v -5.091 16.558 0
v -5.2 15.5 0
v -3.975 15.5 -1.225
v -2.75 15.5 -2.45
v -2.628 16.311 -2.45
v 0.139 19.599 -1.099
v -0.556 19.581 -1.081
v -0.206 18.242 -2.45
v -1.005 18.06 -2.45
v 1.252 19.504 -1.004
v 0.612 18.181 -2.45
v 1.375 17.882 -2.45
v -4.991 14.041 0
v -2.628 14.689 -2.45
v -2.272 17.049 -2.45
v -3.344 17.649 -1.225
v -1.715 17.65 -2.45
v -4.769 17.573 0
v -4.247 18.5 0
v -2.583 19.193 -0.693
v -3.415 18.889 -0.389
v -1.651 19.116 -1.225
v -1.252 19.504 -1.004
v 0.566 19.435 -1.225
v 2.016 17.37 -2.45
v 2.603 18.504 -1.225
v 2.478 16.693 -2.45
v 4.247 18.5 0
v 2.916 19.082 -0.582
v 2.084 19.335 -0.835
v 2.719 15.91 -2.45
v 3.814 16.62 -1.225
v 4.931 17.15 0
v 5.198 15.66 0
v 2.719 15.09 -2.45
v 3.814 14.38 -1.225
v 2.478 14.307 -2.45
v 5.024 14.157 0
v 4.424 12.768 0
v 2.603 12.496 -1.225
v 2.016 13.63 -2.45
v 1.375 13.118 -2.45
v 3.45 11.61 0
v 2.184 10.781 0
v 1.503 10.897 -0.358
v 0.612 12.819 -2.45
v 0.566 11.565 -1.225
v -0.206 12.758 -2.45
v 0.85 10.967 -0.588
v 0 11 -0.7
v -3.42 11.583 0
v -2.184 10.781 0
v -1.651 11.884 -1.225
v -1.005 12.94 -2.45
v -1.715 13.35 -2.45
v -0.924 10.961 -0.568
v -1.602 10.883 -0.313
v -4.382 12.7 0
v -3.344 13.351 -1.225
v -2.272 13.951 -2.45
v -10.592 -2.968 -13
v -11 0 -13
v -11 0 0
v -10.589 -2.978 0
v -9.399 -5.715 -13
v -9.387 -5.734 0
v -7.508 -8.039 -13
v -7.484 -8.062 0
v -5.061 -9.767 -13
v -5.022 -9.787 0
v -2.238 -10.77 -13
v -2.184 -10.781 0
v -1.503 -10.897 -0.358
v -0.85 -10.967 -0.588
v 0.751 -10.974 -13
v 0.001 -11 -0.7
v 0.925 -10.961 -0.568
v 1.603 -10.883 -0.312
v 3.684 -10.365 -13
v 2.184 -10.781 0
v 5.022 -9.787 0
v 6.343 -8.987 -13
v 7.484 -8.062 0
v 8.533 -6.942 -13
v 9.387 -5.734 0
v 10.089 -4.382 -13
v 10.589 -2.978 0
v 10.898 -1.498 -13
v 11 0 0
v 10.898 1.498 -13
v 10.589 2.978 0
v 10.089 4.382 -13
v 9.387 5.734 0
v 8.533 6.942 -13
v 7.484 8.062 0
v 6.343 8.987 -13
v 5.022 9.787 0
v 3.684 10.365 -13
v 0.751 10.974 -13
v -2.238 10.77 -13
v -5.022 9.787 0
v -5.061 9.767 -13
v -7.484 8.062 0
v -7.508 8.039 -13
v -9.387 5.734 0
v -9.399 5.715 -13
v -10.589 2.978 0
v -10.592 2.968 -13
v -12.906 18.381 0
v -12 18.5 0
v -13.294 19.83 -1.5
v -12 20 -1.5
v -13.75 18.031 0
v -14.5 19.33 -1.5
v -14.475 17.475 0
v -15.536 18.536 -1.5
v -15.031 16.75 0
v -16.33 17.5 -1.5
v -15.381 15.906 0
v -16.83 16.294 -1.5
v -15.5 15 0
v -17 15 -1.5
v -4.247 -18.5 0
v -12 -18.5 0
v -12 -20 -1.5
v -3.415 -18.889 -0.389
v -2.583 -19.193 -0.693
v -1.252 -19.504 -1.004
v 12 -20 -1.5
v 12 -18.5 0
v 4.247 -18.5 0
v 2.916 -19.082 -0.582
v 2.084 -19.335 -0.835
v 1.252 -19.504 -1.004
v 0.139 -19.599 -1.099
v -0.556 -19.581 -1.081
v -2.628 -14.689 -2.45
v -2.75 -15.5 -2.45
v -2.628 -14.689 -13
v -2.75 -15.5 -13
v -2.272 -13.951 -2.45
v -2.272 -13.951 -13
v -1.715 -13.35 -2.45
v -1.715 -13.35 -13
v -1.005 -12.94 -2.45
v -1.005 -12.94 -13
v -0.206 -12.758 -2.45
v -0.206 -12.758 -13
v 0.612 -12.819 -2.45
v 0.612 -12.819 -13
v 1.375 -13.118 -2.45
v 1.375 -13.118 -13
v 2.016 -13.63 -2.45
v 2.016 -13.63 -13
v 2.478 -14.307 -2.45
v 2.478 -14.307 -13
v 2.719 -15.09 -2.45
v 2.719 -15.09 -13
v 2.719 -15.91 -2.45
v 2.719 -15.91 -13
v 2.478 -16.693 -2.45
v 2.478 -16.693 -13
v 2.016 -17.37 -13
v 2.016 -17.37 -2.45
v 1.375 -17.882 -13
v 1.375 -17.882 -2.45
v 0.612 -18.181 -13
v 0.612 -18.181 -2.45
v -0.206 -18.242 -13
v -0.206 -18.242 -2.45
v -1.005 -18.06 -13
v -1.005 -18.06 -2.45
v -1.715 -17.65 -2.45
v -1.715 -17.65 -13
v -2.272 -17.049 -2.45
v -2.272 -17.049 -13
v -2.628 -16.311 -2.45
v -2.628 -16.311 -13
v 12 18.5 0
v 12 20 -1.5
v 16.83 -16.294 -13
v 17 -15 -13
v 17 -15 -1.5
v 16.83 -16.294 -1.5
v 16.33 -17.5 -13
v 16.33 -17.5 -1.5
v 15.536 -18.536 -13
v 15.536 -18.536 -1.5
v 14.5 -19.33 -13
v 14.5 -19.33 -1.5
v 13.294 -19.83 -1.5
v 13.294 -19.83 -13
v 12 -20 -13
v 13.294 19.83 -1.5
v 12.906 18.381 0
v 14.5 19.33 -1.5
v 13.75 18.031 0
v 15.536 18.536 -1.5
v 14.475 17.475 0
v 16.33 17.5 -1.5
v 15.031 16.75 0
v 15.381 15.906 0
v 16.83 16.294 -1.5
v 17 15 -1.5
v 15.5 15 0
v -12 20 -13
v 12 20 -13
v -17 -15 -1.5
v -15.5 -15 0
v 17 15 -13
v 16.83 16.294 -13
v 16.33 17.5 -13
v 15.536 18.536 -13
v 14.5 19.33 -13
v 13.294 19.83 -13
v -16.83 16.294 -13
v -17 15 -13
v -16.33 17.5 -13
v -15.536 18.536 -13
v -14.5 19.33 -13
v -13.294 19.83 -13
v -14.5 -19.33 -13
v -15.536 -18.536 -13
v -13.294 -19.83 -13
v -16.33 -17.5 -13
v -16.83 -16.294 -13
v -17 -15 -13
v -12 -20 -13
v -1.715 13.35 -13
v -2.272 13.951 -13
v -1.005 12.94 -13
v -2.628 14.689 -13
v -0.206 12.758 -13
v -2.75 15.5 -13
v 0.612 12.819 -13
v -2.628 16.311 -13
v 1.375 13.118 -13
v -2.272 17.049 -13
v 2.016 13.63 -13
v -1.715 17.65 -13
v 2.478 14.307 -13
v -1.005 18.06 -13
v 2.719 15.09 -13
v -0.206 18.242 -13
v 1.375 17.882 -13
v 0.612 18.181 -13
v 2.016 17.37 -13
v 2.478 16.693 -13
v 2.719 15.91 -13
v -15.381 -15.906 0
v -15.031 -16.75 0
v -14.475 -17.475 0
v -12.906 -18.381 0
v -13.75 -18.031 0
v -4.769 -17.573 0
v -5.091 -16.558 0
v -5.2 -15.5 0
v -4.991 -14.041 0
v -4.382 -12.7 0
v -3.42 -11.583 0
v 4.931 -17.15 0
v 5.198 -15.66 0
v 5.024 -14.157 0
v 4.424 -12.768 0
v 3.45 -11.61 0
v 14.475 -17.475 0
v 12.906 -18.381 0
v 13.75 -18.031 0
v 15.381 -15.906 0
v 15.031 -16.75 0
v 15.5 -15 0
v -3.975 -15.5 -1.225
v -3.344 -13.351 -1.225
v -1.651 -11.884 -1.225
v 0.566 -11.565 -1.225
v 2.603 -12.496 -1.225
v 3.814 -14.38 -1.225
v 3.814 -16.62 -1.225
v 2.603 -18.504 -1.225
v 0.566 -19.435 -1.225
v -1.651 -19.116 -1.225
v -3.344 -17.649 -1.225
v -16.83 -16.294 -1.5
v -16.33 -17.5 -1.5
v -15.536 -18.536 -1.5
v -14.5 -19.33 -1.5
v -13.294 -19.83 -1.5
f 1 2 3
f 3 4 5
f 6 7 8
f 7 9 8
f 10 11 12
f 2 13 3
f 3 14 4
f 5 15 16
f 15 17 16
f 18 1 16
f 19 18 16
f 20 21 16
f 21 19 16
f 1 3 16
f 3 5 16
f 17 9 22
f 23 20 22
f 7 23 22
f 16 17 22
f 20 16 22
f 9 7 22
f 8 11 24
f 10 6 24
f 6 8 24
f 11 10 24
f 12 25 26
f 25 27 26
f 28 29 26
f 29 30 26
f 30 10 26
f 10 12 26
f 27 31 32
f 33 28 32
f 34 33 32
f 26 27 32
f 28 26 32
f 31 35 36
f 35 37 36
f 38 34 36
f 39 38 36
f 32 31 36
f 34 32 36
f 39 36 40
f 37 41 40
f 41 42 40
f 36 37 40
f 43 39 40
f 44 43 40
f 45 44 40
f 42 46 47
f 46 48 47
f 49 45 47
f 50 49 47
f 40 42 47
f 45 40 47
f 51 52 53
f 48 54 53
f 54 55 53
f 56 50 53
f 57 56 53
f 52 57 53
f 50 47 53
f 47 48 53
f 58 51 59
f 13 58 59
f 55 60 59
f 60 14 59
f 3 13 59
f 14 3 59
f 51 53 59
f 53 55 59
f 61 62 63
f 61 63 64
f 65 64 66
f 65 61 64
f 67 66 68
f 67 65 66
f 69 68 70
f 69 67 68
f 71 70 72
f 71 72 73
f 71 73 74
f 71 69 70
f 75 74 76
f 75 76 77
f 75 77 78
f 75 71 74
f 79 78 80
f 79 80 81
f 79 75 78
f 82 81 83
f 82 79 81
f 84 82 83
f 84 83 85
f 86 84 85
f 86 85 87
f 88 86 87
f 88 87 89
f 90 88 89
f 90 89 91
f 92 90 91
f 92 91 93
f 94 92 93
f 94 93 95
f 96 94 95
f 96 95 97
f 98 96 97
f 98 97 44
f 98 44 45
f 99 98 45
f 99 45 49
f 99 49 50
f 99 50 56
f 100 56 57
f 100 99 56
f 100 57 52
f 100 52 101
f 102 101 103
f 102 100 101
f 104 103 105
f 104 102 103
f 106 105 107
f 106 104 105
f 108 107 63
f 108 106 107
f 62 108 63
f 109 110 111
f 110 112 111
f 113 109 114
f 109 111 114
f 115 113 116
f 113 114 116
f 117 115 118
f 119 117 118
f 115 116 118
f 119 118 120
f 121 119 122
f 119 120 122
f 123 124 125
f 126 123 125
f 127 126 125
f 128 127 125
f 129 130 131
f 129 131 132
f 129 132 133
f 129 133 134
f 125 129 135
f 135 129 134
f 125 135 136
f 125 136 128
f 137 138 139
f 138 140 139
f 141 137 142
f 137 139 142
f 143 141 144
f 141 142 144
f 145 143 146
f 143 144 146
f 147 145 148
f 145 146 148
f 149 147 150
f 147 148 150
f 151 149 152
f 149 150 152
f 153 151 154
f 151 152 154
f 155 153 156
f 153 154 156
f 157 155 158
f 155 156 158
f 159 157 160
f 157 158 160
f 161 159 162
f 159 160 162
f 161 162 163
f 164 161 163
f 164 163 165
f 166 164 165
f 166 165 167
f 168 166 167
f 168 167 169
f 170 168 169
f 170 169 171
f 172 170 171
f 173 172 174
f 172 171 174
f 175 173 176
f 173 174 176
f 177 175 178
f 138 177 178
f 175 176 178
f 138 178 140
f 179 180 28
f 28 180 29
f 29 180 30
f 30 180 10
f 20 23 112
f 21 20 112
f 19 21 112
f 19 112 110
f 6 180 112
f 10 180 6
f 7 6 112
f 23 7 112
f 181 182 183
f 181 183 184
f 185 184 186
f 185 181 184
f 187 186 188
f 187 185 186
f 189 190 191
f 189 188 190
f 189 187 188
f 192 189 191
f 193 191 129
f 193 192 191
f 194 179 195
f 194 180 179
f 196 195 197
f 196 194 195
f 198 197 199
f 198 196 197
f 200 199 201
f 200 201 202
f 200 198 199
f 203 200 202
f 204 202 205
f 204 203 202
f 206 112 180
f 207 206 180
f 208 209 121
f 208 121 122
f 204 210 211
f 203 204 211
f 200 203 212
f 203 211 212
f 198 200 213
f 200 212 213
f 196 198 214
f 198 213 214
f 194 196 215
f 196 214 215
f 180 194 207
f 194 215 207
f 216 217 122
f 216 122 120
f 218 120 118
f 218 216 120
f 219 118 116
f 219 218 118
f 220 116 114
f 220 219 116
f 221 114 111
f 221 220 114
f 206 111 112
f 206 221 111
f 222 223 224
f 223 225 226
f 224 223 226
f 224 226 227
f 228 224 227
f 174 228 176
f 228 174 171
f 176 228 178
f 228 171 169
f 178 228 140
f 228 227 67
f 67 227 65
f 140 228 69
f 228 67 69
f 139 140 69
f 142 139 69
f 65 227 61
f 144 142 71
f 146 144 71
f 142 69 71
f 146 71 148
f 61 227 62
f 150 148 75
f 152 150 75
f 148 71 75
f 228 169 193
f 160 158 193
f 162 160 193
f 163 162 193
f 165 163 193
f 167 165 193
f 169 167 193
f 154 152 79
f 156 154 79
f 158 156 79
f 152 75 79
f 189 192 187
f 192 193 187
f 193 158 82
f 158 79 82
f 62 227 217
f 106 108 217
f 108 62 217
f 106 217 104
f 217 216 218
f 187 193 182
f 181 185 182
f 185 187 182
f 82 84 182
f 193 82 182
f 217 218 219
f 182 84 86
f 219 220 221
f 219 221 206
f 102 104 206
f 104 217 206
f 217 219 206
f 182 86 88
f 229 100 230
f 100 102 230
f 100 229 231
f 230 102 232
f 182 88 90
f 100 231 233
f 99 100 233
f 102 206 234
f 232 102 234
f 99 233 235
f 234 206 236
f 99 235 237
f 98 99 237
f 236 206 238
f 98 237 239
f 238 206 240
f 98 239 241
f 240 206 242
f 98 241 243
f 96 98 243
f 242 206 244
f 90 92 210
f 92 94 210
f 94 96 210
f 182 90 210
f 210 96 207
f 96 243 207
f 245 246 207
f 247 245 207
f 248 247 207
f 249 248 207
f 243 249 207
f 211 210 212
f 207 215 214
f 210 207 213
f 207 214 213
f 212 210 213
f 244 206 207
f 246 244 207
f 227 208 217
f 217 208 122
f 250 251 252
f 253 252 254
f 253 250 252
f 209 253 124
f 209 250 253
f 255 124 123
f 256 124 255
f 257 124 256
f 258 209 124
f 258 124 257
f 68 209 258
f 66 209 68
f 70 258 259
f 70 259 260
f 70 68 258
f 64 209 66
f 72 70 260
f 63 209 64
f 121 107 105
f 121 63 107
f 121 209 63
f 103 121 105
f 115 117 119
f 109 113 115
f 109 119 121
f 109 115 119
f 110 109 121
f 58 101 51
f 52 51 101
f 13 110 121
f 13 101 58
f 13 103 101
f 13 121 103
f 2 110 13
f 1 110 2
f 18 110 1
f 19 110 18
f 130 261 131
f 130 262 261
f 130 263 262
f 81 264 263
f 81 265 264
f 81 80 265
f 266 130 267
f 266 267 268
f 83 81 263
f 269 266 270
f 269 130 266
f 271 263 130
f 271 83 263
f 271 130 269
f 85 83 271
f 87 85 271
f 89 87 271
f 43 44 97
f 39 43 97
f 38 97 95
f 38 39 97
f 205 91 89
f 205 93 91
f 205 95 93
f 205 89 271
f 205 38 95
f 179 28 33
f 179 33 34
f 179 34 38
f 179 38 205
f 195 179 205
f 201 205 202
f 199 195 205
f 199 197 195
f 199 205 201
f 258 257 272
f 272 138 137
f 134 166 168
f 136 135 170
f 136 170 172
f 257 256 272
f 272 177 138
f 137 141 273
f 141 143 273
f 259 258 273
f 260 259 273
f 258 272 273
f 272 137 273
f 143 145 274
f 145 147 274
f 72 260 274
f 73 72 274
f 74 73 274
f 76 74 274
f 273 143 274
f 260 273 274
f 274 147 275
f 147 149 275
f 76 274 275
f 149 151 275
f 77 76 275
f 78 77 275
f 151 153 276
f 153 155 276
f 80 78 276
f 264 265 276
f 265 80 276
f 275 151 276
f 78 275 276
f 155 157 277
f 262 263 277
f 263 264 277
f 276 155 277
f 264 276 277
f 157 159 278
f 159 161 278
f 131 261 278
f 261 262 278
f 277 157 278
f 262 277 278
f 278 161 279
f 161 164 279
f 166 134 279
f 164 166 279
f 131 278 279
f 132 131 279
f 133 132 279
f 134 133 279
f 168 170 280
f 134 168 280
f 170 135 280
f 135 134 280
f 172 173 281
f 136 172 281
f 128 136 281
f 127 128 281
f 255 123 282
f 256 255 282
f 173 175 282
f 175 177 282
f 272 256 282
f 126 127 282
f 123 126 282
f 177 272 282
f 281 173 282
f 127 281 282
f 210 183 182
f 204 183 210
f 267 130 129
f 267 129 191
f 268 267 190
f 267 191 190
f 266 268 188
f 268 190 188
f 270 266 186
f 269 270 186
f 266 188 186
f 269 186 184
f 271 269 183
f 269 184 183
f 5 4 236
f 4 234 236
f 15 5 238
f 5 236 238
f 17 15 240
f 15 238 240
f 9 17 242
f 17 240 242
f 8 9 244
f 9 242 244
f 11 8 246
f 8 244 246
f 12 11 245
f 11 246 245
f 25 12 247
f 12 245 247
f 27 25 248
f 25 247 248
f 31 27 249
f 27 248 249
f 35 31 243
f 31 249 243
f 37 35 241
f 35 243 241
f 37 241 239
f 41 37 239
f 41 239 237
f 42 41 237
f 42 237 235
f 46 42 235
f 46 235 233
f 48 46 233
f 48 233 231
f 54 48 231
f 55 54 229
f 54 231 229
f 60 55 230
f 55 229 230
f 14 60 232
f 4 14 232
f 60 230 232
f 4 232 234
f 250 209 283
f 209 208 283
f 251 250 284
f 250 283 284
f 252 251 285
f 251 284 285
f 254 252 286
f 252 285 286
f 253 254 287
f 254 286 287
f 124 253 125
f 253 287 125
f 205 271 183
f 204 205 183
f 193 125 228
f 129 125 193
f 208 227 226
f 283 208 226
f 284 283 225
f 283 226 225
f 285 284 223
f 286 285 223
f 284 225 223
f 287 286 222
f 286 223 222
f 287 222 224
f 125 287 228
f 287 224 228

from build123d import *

# Parameters (mm, degrees)
SKETCH_1_W                 = 34
SKETCH_1_H                 = 40
EXTRUDE_273_DEPTH          = 13
SKETCH_2_R                 = 11
CUT_EXTRUDE_457_DEPTH      = 13
HOLE_WIZARD_M6_D           = 5.5
HOLE_WIZARD_M6_CSINK_D     = 10.4
HOLE_WIZARD_M6_CSINK_ANGLE = 90
FILLET_1404_R              = 5
CHAMFER_1_SIZE             = 1.5


with BuildPart() as part:
    # Эскиз1 → Extrude 273 (new body)
    with BuildSketch(Plane.XY):
        Rectangle(SKETCH_1_W, SKETCH_1_H)
    extrude(amount=-EXTRUDE_273_DEPTH)

    # Эскиз2 → Cut-Extrude 457 (cut)
    with BuildSketch(Plane.XY.offset(-13)):
        with Locations(Location((0, 0, 0), (0, 0, 180))):
            Circle(SKETCH_2_R)
    extrude(amount=CUT_EXTRUDE_457_DEPTH, mode=Mode.SUBTRACT)

    # КреплениеM6 (through all)
    with Locations(Plane.XY):
        with Locations((0, 15.5), (0, -15.5)):
            CounterSinkHole(HOLE_WIZARD_M6_D / 2, HOLE_WIZARD_M6_CSINK_D / 2, counter_sink_angle=HOLE_WIZARD_M6_CSINK_ANGLE)

    # Fillet 1404
    fillet_1404_edges = [part.edges().sort_by_distance(p)[0] for p in [
        (17, -20, -6.5),
        (-17, -20, -6.5),
        (-17, 20, -6.5),
        (17, 20, -6.5),
    ]]
    fillet(fillet_1404_edges, radius=FILLET_1404_R)

    # Фаска1
    # the kernel refuses this chamfer: 1.5 mm, written as the material it takes off along each edge
    with BuildSketch(Plane(origin=(-12, -15, 0), x_dir=(-1, 0, 0), z_dir=(0, 1, 0))) as chamfer_1_piece_1:
        Polygon((5 - CHAMFER_1_SIZE, 0), (5, -CHAMFER_1_SIZE), (5, 0), align=None)
    revolve(axis=Axis((-12, -15, 0), (0, 0, 1)), revolution_arc=90, mode=Mode.SUBTRACT)
    with BuildSketch(Plane(origin=(1.251761638, -20, 0), x_dir=(0, 0.9996219169112968, 0.02749587661058636), z_dir=(-1, 0, 0)), Plane(origin=(12, -20, 0), x_dir=(0, 0.9996219169112968, 0.02749587661058636), z_dir=(-1, 0, 0))) as chamfer_1_piece_2:
        Polygon((CHAMFER_1_SIZE * 0.999621916911, CHAMFER_1_SIZE * 0.0274958766106), (-CHAMFER_1_SIZE * 0.0274958766106, CHAMFER_1_SIZE * 0.999621916911), (0, 0), align=None)
    extrude(amount=13.251761638, mode=Mode.SUBTRACT)
    with BuildSketch(Plane(origin=(12, -15, 0), x_dir=(0, -1, 0), z_dir=(-1, 0, 0))) as chamfer_1_piece_3:
        Polygon((5 - CHAMFER_1_SIZE, 0), (5, -CHAMFER_1_SIZE), (5, 0), align=None)
    revolve(axis=Axis((12, -15, 0), (0, 0, 1)), revolution_arc=90, mode=Mode.SUBTRACT)
    with BuildSketch(Plane(origin=(17, 15, 0), x_dir=(-0.9996219169112968, 0, 0.02749587661058636), z_dir=(0, -1, 0)), Plane(origin=(-17, -15, 0), x_dir=(0.9996219169112968, 0, 0.02749587661058636), z_dir=(0, 1, 0))) as chamfer_1_piece_4:
        Polygon((CHAMFER_1_SIZE * 0.999621916911, CHAMFER_1_SIZE * 0.0274958766106), (-CHAMFER_1_SIZE * 0.0274958766106, CHAMFER_1_SIZE * 0.999621916911), (0, 0), align=None)
    extrude(amount=30, mode=Mode.SUBTRACT)
    with BuildSketch(Plane(origin=(12, 15, 0), x_dir=(0, 1, 0), z_dir=(-1, 0, 0))) as chamfer_1_piece_5:
        Polygon((5 - CHAMFER_1_SIZE, 0), (5, CHAMFER_1_SIZE), (5, 0), align=None)
    revolve(axis=Axis((12, 15, 0), (0, 0, -1)), revolution_arc=90, mode=Mode.SUBTRACT)
    with BuildSketch(Plane(origin=(-12, 20, 0), x_dir=(0, 0.027495876610586778, -0.9996219169112968), z_dir=(1, 0, 0)), Plane(origin=(-1.251761638, 20, 0), x_dir=(0, 0.027495876610586778, -0.9996219169112968), z_dir=(1, 0, 0))) as chamfer_1_piece_6:
        Polygon((CHAMFER_1_SIZE * 0.999621916911, -CHAMFER_1_SIZE * 0.0274958766106), (-CHAMFER_1_SIZE * 0.0274958766106, -CHAMFER_1_SIZE * 0.999621916911), (0, 0), align=None)
    extrude(amount=13.251761638, mode=Mode.SUBTRACT)
    with BuildSketch(Plane(origin=(-12, 15, 0), x_dir=(0, 1, 0), z_dir=(1, 0, 0))) as chamfer_1_piece_7:
        Polygon((5 - CHAMFER_1_SIZE, 0), (5, -CHAMFER_1_SIZE), (5, 0), align=None)
    revolve(axis=Axis((-12, 15, 0), (0, 0, 1)), revolution_arc=90, mode=Mode.SUBTRACT)


solid = part.part
